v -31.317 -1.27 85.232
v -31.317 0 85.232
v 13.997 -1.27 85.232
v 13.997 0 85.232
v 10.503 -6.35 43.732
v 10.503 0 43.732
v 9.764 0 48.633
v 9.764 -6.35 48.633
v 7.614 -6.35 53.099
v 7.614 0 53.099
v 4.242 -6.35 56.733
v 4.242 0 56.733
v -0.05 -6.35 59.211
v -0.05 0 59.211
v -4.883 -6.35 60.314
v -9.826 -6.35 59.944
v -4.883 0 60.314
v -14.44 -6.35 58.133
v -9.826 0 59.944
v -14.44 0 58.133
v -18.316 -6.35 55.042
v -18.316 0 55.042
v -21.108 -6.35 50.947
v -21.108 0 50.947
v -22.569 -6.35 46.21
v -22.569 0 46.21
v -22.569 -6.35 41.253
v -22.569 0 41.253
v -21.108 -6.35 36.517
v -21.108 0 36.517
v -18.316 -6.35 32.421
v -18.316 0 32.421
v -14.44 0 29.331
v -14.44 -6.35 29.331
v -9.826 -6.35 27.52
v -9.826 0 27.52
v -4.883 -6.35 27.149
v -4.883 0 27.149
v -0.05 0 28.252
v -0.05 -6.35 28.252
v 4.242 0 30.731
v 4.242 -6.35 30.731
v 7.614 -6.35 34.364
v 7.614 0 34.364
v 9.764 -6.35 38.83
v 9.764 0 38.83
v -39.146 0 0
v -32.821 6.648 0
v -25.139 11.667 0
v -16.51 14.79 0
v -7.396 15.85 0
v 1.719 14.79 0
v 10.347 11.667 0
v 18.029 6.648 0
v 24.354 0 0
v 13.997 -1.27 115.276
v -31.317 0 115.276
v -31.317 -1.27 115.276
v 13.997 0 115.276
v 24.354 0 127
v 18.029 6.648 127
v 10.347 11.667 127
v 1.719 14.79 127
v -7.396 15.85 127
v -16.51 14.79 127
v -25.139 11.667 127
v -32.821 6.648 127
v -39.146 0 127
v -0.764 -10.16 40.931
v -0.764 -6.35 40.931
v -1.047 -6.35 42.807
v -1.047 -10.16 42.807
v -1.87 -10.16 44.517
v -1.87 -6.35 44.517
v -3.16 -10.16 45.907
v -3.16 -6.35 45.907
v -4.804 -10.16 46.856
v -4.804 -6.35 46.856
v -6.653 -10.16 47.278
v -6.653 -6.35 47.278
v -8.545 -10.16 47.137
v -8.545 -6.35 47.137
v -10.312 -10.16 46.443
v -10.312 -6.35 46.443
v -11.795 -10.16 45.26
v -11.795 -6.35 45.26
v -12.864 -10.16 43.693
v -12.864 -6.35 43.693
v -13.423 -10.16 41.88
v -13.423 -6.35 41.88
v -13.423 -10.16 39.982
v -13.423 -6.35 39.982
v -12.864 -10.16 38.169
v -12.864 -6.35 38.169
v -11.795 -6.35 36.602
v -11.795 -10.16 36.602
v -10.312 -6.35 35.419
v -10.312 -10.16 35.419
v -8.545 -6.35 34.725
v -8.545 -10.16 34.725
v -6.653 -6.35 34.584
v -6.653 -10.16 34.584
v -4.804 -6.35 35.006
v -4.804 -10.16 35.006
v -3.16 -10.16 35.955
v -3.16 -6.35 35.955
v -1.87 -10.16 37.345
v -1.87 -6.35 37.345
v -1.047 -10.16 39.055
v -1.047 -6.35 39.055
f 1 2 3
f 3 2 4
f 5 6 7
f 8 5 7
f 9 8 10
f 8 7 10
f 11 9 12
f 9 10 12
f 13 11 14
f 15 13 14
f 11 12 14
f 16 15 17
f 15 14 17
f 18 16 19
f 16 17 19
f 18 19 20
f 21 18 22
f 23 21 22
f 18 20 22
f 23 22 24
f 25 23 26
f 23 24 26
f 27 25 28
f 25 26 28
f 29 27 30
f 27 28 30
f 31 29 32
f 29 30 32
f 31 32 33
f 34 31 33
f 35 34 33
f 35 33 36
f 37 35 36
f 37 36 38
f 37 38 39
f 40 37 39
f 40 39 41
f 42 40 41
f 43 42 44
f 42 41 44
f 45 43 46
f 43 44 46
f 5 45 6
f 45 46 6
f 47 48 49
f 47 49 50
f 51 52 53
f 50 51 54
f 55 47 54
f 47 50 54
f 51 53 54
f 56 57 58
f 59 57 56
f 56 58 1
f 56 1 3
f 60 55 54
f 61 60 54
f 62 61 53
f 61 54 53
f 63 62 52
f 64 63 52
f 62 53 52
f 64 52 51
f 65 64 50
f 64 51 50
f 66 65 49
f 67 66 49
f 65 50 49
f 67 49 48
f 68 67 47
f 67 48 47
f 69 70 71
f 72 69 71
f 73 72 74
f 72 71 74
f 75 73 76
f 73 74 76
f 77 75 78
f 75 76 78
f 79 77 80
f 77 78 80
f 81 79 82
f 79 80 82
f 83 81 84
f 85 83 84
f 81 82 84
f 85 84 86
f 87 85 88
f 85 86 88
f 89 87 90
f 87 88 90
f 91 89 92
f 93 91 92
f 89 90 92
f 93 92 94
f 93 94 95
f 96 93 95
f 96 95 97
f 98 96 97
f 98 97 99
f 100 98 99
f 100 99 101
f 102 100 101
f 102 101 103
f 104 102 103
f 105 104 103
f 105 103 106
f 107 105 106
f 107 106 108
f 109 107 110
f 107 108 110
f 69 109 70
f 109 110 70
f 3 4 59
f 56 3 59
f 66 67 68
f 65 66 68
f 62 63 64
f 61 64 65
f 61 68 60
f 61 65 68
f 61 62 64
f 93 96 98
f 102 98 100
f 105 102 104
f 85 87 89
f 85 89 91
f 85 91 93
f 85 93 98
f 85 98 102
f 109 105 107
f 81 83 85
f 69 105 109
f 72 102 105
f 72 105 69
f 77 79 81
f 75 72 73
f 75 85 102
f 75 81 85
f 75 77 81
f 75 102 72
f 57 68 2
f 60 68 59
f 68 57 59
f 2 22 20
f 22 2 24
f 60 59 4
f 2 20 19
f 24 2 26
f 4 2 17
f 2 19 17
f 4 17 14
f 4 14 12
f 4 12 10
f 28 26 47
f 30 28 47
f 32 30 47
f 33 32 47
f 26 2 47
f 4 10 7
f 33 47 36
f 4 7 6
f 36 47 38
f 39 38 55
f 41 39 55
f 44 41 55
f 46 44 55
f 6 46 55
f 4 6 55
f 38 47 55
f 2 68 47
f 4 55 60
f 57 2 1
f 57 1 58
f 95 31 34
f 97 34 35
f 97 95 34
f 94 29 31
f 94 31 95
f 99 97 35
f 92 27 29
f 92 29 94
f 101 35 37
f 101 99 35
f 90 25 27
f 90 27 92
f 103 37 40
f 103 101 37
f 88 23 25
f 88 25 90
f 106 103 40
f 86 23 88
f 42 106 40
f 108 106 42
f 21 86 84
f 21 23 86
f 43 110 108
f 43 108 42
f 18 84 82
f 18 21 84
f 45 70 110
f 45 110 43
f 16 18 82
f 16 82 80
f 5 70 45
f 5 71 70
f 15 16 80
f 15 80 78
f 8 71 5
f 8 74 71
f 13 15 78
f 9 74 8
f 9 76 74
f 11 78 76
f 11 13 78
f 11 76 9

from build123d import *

# Parameters (mm, degrees)
F1_DEPTH  = 127
F2_R      = 16.6289302691
F3_DEPTH  = 6.35
F4_W      = 2.8006685898
F4_H      = 13.494130224
F4_W_2    = 2.8006681241
F4_H_2    = 14.0033438802
F5_DEPTH  = 2.54
F6_R      = 6.3651576638
F7_DEPTH  = 3.81
F10_W     = 45.3136
F10_H     = 30.0435274839
F11_DEPTH = 1.27


# Not quite as in the source:
# - a feature of the source that left no trace in its solid (it failed there, or was rolled back) is left out


with BuildPart() as f1:
    # F0 (on Top) → F1 (new body)
    with BuildSketch(Plane.XY):
        with BuildLine():
            ThreePointArc((24.3542956412, 0), (-7.3957043588, 15.8499764569), (-39.1457043588, 0))
            Line((-39.1457043588, 0), (24.3542956412, 0))
        make_face()
    extrude(amount=F1_DEPTH)

    # F2 (on face) → F3 (join)
    with BuildSketch(Plane.XZ):
        with Locations((-6.1257043588, 43.7316484749)):
            Circle(F2_R)
    extrude(amount=F3_DEPTH)

    # F4 (on face) → F5 (join)
    with BuildSketch(Plane.XZ.offset(6.35)):
        with Locations((-15.4036753811, 41.3128901273)):
            Rectangle(F4_W, F4_H)
        with Locations((1.4003340621, 41.0582832992)):
            Rectangle(F4_W_2, F4_H_2)
    extrude(amount=-F5_DEPTH)

    # F6 (on face) → F7 (join)
    with BuildSketch(Plane.XZ.offset(6.35)):
        with Locations((-7.1289734915, 40.9309826791)):
            Circle(F6_R)
    extrude(amount=F7_DEPTH)

    # F10 (on face) → F11 (join)
    with BuildSketch(Plane.XZ):
        with Locations((-8.6597625557, 100.2542302012)):
            Rectangle(F10_W, F10_H)
    extrude(amount=F11_DEPTH)


solid = f1.part
